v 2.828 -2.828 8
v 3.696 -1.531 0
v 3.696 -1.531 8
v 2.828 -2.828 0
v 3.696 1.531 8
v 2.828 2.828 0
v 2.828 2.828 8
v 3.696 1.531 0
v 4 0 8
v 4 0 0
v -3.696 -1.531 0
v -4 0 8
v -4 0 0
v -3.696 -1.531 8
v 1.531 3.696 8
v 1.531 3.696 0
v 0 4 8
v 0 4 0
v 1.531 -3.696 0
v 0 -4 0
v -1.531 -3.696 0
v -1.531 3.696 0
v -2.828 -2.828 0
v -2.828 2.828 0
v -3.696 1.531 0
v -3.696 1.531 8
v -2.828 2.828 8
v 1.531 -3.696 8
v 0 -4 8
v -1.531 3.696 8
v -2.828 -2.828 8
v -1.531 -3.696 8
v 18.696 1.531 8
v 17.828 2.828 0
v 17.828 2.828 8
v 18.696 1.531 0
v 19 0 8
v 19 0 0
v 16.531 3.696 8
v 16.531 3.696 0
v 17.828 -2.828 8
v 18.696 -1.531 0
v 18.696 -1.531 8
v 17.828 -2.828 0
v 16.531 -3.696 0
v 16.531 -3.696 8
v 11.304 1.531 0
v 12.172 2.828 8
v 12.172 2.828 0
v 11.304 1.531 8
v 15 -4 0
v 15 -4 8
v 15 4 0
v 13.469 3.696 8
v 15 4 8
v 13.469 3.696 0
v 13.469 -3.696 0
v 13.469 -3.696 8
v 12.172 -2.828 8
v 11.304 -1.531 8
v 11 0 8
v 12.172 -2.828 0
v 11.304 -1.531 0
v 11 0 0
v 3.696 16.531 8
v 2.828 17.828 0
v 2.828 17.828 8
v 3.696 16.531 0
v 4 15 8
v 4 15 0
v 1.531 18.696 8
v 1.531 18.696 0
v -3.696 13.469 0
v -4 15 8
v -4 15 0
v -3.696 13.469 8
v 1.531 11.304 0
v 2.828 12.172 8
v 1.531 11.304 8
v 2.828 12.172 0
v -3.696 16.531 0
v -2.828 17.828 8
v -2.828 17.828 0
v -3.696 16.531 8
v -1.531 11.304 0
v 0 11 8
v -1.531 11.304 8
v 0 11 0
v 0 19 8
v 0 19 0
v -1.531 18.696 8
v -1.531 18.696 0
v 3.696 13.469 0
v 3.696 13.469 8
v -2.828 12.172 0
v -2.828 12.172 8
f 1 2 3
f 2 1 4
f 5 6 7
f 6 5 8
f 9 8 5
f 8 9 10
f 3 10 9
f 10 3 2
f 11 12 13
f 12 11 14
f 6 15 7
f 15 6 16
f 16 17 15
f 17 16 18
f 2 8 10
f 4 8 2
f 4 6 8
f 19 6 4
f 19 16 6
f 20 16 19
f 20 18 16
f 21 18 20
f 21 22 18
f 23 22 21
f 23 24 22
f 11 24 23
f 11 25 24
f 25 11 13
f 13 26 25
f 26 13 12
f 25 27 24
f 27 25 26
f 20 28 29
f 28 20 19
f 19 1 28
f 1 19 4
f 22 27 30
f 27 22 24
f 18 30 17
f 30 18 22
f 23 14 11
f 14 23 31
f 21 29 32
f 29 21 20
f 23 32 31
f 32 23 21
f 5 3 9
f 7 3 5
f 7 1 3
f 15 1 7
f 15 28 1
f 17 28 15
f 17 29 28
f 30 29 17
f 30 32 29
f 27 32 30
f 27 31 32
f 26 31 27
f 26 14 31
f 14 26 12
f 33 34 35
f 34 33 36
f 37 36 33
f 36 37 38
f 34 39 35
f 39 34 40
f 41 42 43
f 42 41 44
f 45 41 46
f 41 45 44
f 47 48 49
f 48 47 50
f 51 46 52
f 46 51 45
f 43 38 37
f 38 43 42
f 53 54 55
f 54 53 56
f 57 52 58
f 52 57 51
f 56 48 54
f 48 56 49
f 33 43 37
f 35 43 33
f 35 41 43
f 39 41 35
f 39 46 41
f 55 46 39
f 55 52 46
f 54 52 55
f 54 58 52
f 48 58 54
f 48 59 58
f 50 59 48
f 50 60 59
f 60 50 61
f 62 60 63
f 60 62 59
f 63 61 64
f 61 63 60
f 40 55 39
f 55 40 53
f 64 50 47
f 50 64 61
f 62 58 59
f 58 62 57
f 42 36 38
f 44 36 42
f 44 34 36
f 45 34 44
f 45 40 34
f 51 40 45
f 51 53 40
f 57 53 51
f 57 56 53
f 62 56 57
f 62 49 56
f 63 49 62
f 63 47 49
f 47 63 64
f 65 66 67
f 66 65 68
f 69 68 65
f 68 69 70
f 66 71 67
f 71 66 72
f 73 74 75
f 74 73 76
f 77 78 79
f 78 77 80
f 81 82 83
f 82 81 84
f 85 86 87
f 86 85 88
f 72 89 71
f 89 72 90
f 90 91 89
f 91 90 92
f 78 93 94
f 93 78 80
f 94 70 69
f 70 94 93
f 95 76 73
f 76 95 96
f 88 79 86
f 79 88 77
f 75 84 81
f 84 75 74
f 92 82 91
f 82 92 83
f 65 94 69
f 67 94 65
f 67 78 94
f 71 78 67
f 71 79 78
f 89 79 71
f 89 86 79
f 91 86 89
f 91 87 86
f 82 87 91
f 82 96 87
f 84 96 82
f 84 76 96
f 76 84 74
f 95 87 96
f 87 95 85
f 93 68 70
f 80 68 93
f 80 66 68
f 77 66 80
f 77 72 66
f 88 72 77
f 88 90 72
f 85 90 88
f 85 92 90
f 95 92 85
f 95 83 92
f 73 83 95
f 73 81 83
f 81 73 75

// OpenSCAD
union() {
  for (v = [[0, 0], [15, 0], [0, 15]]) translate([v[0], v[1], 0]) cylinder(h = 8, r = 4, $fn = 16);
}
